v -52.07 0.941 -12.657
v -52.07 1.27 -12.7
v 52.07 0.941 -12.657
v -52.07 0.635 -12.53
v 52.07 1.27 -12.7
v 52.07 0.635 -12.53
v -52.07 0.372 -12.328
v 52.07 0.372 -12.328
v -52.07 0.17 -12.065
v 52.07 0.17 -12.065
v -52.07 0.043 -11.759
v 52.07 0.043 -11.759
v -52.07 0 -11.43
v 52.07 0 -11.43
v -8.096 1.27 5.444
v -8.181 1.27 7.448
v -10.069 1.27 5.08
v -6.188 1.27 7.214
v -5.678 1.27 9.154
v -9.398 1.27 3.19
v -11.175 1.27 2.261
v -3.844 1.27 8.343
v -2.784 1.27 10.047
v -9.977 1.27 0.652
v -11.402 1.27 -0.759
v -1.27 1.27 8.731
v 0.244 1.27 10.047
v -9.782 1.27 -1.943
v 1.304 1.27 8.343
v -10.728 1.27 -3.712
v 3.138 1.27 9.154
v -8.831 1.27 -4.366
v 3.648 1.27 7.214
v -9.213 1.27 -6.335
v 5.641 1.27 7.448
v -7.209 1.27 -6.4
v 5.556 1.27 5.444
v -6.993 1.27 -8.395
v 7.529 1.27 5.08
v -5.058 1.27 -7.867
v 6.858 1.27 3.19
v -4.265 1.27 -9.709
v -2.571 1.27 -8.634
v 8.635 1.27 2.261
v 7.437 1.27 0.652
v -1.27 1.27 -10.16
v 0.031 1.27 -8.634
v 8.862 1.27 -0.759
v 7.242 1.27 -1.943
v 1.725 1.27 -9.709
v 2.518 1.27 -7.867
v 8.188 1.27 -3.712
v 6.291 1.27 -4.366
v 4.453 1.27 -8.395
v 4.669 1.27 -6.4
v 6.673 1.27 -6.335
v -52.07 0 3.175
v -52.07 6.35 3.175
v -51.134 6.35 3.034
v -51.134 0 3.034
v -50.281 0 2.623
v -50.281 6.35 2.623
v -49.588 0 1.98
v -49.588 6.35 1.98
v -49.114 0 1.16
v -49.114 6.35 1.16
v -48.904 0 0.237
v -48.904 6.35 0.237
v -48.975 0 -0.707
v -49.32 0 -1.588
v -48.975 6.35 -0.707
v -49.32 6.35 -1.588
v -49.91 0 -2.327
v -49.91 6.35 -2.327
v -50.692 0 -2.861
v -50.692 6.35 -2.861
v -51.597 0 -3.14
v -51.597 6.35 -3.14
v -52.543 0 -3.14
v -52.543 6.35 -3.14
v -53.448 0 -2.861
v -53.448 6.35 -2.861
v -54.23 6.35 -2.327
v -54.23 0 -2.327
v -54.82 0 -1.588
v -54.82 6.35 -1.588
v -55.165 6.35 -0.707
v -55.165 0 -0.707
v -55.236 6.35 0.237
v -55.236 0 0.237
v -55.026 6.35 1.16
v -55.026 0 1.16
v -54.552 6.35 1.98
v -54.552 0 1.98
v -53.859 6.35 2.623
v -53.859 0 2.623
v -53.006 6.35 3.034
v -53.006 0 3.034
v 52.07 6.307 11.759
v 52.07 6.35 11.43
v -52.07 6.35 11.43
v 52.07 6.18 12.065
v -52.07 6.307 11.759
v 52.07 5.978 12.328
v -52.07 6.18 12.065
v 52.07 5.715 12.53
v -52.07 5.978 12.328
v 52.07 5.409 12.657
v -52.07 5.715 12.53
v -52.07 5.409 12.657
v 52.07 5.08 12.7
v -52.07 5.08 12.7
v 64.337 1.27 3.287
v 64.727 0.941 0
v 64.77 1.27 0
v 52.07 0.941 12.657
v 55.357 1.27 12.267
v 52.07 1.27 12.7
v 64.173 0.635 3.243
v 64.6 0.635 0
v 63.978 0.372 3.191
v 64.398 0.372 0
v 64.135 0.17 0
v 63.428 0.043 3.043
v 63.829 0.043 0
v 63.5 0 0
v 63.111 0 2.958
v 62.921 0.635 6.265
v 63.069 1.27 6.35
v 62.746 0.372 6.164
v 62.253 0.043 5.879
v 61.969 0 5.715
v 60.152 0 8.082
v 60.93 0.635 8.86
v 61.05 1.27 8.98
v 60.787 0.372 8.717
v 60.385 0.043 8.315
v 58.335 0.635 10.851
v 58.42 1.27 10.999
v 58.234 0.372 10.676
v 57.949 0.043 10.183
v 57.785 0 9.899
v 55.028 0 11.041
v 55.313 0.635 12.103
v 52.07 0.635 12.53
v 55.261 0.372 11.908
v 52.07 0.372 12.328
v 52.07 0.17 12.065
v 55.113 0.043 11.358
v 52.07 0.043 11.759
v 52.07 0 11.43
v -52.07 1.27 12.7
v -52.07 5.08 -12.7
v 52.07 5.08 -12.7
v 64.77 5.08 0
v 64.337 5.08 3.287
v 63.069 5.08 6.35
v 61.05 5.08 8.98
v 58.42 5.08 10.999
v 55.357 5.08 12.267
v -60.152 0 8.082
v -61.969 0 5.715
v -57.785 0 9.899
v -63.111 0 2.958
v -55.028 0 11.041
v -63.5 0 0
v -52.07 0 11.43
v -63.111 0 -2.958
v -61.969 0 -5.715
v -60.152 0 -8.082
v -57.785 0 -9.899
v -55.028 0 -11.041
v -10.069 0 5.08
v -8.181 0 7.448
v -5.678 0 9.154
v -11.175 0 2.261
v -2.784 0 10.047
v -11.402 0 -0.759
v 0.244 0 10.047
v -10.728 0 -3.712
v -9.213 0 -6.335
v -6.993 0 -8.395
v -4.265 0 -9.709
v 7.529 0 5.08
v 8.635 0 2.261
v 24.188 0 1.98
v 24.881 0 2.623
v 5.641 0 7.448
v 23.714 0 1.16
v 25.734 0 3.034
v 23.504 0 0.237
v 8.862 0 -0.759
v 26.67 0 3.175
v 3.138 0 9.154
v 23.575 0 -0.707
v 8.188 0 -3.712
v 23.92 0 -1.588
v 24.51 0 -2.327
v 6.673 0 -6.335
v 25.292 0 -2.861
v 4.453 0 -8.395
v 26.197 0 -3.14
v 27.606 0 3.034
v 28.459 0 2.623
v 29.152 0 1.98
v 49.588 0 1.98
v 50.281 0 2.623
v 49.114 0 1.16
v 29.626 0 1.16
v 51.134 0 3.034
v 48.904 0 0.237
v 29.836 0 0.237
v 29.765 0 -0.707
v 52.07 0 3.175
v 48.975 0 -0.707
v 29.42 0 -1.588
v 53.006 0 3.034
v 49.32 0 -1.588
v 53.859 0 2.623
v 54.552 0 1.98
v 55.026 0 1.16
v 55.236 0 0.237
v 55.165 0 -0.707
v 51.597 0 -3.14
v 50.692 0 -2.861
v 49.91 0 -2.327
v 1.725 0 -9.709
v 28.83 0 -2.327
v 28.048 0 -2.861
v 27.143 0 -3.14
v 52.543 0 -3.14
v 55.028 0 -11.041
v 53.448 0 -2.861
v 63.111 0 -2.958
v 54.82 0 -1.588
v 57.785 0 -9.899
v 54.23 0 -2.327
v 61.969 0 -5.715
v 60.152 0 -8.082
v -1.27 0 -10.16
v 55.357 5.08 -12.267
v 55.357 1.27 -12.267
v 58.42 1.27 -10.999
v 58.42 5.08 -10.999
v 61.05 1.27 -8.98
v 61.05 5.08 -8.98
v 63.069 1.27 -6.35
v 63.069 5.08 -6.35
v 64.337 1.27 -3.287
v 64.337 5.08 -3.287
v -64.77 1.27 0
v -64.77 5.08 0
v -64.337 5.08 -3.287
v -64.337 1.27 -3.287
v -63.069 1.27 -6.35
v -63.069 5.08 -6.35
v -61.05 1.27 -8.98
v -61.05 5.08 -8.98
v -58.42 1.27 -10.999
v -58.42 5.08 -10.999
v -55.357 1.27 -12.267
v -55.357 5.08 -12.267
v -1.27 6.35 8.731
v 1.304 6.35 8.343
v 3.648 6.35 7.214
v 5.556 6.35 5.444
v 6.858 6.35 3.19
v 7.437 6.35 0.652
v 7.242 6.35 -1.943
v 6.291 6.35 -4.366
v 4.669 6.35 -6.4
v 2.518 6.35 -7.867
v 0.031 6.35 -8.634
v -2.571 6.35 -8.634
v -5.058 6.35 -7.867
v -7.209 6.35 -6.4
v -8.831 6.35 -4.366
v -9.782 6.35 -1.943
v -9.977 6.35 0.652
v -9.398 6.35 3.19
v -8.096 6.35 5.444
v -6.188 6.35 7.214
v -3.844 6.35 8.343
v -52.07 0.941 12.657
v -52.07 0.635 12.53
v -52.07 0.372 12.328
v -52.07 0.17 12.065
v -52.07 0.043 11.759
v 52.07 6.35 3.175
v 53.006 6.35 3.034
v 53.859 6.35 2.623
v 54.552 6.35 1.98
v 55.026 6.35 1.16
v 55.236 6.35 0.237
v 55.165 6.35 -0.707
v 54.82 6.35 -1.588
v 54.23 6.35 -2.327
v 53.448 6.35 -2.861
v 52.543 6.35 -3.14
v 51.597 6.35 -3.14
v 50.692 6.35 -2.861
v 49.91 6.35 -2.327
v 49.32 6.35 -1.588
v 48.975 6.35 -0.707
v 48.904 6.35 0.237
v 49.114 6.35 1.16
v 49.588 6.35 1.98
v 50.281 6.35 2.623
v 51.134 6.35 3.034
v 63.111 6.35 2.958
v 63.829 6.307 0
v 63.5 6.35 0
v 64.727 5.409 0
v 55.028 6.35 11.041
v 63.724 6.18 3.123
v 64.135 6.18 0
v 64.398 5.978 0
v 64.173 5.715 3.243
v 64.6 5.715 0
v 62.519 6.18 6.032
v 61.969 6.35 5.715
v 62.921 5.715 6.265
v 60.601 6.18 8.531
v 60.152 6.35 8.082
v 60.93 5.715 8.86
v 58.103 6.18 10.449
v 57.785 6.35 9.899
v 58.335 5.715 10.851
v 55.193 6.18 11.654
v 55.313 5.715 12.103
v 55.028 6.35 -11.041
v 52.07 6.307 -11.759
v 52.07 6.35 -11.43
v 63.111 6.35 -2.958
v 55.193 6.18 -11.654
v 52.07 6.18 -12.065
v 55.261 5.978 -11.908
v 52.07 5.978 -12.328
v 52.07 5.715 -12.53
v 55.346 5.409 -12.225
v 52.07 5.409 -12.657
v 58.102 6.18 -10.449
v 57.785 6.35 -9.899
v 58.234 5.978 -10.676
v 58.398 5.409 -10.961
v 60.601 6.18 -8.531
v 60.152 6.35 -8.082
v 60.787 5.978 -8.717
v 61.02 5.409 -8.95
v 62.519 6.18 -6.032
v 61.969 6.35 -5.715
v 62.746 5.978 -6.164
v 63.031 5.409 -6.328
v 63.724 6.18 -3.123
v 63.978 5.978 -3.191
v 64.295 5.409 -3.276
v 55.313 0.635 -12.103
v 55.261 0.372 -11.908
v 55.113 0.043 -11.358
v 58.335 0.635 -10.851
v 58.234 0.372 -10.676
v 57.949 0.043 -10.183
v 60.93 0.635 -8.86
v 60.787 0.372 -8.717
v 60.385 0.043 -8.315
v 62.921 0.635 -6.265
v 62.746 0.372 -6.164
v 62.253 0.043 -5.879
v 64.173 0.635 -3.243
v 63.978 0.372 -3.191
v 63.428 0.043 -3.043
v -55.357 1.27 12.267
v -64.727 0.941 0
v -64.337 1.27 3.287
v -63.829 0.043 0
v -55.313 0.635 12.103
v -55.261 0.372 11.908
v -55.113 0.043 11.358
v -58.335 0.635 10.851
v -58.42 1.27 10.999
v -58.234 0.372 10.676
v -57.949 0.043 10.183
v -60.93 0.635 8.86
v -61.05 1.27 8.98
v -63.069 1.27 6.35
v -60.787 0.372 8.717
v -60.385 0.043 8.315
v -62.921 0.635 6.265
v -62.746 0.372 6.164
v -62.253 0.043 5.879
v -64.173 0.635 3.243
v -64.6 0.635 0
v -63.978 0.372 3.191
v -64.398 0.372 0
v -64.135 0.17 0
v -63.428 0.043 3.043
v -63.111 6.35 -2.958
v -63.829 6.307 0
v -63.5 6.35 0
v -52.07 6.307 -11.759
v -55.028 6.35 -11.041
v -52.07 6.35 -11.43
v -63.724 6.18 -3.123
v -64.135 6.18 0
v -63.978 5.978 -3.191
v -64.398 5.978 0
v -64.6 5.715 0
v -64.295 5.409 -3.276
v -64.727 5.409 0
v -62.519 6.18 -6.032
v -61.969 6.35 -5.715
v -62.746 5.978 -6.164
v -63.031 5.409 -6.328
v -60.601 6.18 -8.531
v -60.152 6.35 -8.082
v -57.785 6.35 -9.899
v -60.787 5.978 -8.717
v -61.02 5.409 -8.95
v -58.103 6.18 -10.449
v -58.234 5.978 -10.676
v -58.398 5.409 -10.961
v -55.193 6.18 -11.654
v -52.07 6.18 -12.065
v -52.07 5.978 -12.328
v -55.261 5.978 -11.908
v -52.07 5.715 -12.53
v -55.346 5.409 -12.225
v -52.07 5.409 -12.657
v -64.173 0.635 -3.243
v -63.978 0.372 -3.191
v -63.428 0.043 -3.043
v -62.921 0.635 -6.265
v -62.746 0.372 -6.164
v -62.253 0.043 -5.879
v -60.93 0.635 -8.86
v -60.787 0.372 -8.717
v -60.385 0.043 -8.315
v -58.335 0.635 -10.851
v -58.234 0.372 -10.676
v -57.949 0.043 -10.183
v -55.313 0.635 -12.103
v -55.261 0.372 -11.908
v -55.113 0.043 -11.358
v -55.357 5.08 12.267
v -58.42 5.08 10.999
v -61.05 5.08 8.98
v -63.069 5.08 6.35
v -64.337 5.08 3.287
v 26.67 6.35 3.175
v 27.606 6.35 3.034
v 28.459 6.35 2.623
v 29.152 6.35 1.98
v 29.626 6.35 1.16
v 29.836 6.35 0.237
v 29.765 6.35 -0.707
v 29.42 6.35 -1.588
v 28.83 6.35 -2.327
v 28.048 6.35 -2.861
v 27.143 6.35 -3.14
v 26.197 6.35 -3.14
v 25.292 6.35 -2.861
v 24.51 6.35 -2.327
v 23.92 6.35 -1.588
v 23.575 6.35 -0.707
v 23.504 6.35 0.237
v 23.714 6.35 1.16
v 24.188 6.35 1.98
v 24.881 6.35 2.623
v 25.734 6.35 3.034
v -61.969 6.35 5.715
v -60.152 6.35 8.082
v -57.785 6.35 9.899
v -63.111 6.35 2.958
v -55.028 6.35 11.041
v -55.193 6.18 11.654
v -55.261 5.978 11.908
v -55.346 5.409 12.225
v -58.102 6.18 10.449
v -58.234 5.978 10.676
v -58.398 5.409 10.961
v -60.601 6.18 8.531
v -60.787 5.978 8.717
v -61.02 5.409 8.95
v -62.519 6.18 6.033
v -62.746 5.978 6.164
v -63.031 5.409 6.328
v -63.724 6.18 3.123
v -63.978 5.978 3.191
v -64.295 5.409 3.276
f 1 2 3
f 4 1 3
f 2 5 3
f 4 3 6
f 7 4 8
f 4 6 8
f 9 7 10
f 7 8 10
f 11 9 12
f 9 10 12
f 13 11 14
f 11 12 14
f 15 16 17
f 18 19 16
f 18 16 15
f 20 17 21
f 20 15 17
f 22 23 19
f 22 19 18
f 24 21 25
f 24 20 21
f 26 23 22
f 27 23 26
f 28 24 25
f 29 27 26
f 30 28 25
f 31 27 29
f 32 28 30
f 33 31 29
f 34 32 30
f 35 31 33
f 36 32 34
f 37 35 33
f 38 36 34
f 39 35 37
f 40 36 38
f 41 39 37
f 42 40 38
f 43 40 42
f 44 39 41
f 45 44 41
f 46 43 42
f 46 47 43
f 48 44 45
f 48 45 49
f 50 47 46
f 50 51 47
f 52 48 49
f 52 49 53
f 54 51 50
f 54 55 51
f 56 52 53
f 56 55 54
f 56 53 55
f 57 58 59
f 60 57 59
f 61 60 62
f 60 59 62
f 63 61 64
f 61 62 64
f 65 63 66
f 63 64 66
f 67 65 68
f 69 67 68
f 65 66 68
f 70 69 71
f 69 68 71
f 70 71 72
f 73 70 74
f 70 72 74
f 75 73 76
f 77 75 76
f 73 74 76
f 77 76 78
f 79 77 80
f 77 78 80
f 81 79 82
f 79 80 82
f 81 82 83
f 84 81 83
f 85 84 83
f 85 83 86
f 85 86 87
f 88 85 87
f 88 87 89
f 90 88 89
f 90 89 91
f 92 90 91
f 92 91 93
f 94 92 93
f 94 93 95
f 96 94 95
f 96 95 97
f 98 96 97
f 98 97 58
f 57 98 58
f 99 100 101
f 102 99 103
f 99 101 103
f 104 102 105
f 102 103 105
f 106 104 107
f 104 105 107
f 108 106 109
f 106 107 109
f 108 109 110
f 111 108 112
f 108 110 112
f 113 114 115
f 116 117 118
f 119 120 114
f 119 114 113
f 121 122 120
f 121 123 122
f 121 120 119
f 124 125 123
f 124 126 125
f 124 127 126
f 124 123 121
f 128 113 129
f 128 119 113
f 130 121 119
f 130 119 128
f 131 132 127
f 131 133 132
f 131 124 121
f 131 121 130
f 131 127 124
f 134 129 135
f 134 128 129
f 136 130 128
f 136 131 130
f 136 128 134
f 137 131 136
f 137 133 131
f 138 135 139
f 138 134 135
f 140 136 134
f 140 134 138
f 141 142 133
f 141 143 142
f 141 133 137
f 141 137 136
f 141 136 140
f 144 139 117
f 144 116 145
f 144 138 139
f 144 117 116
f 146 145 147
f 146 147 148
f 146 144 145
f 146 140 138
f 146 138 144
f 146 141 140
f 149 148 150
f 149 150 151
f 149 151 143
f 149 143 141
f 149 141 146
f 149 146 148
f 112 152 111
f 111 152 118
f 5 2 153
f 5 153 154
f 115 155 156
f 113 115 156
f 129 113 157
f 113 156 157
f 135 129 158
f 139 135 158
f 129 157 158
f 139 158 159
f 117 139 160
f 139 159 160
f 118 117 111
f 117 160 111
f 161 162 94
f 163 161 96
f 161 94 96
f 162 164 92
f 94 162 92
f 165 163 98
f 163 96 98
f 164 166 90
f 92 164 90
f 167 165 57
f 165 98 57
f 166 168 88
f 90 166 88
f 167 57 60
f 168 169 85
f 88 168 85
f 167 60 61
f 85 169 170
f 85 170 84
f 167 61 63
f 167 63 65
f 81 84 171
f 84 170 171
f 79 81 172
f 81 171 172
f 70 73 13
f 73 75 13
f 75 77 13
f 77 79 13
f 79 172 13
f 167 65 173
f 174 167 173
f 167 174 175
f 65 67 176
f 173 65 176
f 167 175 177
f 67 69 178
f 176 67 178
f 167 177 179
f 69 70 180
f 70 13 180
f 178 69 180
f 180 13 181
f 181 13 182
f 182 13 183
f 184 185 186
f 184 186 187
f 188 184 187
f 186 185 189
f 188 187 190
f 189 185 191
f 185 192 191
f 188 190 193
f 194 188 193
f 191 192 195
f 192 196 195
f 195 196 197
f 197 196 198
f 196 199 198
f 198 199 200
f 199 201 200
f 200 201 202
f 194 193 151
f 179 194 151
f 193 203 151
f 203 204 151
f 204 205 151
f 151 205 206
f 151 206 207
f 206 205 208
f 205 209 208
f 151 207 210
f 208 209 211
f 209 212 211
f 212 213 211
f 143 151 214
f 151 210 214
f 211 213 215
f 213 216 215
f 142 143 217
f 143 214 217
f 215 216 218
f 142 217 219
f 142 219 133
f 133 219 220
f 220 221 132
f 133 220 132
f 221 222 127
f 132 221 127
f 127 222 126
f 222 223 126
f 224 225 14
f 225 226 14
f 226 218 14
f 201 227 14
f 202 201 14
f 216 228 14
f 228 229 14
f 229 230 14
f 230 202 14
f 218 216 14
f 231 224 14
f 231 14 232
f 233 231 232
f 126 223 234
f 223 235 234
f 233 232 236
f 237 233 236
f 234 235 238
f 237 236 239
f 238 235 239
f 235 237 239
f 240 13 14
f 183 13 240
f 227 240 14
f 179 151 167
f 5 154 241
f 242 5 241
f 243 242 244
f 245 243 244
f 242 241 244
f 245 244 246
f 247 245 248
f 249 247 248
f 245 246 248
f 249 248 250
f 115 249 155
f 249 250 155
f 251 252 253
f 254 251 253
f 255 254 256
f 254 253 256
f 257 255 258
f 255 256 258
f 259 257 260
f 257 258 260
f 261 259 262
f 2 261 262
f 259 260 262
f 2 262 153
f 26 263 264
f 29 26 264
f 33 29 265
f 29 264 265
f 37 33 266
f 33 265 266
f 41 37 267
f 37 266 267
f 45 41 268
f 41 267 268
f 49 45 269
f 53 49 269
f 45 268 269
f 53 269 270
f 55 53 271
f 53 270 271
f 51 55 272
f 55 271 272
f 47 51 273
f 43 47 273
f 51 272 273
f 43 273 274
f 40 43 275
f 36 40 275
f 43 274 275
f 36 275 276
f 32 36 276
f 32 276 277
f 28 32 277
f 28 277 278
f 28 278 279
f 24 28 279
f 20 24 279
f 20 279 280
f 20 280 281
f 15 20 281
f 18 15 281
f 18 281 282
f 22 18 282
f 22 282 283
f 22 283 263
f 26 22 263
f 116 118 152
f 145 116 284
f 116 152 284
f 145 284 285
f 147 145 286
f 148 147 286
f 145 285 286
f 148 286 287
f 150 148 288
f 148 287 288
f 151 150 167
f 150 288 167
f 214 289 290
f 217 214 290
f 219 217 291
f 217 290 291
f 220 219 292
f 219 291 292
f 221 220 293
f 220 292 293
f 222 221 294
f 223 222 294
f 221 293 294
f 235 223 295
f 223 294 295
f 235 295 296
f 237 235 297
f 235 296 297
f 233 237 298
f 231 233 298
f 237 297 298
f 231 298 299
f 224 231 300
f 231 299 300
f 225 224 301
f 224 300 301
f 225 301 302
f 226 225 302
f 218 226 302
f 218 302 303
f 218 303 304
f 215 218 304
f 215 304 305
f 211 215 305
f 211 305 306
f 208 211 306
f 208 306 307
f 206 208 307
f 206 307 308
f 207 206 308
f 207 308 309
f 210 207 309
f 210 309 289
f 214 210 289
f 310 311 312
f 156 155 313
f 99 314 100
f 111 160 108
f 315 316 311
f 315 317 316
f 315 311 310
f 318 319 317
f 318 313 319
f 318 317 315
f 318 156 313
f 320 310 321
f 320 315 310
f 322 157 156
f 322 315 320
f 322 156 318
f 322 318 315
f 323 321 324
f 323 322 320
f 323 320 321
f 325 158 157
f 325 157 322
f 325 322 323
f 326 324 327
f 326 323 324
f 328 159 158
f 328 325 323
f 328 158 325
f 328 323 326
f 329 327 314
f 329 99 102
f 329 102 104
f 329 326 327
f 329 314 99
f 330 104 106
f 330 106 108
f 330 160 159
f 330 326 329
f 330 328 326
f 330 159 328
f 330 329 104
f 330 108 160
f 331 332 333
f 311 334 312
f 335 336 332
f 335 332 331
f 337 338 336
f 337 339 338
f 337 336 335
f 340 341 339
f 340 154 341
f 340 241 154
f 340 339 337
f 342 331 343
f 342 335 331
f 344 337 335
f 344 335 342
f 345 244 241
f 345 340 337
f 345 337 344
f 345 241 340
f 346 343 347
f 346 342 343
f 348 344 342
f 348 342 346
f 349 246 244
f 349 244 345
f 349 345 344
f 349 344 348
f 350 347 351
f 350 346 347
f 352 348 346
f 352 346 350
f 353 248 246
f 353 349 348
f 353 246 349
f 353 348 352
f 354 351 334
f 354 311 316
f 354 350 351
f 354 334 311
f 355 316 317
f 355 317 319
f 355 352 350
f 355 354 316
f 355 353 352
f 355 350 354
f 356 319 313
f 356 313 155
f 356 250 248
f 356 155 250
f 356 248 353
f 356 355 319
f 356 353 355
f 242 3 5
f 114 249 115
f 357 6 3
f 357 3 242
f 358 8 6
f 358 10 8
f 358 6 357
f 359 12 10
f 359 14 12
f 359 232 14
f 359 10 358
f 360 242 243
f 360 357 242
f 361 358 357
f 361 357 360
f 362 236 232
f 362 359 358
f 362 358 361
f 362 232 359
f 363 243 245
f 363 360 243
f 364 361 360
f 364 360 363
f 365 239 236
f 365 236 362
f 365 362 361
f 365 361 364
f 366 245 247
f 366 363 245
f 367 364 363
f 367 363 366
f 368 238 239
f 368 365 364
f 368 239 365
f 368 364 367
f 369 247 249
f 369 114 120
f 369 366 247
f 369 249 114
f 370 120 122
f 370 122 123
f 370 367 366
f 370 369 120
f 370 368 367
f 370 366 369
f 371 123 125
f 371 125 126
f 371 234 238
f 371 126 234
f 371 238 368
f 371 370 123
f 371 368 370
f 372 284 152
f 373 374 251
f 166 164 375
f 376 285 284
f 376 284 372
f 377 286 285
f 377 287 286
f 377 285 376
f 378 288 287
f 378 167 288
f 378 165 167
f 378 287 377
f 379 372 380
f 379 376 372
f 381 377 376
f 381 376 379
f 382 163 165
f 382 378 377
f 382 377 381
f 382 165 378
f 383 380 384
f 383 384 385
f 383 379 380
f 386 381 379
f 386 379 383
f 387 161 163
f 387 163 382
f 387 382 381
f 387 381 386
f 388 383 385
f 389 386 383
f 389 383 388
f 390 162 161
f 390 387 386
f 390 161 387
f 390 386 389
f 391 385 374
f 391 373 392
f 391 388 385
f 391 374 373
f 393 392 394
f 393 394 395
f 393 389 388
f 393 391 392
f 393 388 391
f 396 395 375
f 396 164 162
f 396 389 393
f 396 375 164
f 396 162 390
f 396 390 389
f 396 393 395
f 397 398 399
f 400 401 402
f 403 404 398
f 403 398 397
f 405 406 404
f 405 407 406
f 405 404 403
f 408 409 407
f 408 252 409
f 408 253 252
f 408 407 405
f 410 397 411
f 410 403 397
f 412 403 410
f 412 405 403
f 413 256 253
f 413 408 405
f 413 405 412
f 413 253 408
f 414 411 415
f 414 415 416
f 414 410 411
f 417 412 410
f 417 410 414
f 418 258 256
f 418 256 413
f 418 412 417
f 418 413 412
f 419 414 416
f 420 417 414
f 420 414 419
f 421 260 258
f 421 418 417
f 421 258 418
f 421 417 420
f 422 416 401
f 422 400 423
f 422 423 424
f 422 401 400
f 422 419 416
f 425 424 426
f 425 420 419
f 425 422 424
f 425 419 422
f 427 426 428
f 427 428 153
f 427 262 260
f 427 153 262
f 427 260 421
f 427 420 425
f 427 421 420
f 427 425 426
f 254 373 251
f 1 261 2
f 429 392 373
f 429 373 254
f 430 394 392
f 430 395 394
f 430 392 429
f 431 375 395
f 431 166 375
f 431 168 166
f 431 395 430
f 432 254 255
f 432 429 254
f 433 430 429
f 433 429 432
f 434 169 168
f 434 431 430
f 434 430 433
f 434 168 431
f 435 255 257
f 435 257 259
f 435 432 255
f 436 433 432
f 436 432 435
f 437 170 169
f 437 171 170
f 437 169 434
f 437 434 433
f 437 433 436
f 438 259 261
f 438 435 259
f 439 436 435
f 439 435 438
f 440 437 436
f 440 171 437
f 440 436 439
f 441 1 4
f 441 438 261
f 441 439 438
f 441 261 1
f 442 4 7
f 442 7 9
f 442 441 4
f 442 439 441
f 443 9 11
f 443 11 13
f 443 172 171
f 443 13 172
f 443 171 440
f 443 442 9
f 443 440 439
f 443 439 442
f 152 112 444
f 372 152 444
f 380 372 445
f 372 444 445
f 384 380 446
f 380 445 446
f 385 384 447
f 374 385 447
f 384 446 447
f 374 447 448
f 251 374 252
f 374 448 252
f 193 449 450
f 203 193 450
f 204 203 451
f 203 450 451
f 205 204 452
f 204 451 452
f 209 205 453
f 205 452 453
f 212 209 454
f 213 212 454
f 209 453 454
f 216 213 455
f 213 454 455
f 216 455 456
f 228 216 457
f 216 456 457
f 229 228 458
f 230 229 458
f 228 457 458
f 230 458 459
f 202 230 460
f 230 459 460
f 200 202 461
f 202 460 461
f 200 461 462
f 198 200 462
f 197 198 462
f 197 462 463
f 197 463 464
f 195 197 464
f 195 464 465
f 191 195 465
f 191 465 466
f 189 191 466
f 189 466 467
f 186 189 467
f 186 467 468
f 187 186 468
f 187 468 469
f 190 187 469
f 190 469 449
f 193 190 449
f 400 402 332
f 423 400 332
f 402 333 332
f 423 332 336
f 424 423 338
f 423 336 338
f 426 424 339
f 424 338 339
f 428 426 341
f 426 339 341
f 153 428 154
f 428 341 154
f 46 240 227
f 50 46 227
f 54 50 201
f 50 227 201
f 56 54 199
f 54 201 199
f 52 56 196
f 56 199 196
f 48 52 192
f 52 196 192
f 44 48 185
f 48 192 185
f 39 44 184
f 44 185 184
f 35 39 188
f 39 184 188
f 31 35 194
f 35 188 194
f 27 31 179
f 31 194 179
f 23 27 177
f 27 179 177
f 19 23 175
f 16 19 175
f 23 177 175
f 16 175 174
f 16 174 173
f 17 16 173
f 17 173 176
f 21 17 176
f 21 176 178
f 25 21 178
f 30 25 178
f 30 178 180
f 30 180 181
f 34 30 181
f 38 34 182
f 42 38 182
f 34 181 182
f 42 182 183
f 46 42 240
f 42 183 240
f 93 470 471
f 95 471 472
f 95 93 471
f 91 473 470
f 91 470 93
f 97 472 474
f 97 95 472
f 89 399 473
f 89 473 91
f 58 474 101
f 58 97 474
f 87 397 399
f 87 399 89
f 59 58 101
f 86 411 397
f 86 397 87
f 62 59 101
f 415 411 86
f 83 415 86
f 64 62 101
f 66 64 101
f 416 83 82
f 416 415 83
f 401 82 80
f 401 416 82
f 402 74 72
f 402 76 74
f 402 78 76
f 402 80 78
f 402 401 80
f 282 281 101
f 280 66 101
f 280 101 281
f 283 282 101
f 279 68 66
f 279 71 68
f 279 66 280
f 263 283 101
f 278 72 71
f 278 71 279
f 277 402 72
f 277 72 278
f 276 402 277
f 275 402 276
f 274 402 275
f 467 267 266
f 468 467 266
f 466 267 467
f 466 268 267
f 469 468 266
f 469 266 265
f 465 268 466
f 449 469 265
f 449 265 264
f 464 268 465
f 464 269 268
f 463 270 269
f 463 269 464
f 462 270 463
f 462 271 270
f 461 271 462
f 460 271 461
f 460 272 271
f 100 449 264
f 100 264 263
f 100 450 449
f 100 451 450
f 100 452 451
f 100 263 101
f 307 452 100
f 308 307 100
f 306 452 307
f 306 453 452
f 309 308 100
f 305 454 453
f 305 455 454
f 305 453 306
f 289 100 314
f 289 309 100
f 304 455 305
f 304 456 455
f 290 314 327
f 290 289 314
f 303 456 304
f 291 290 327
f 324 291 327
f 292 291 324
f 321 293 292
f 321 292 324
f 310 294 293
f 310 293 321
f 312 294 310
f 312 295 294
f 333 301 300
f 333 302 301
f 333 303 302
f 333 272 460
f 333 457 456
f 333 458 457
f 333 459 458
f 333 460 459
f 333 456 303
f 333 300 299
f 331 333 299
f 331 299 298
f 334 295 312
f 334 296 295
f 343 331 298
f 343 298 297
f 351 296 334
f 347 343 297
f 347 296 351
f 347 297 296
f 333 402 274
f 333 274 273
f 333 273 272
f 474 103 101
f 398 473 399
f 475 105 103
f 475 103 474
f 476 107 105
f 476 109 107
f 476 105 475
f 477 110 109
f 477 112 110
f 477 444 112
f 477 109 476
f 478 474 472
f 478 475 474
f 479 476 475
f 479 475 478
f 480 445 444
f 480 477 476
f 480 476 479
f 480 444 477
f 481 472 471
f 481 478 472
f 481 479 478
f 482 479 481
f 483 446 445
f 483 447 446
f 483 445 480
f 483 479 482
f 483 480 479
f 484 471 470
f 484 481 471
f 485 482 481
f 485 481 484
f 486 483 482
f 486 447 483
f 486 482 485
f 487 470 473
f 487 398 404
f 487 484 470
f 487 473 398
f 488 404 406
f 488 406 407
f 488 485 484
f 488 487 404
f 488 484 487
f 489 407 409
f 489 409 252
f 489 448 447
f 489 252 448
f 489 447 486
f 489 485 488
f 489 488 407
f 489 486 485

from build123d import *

# Parameters (mm, degrees)
SKETCH1_W           = 129.54
SKETCH1_H           = 25.4
BOSS_EXTRUDE1_DEPTH = 6.35
SKETCH2_R           = 3.175
SKETCH2_R_2         = 8.73125
CUT_EXTRUDE1_DEPTH  = 67.30810961
SKETCH3_R           = 10.16
CUT_EXTRUDE2_DEPTH  = 1.27
CUT_EXTRUDE3_DEPTH  = 67.30810961
FILLET1_R           = 1.27


with BuildPart() as part:
    # Sketch1 → Boss-Extrude1 (new body)
    with BuildSketch(Plane(origin=(0, 0, 0), x_dir=(1, 0, 0), z_dir=(0, 1, 0))):
        Rectangle(SKETCH1_W, SKETCH1_H)
    extrude(amount=BOSS_EXTRUDE1_DEPTH)

    # Sketch2 → Cut-Extrude1 (cut, through all)
    with BuildSketch(Plane(origin=(0, 6.35, 0), x_dir=(1, 0, 0), z_dir=(0, 1, 0))):
        with Locations(Location((-52.07, 0, 0), (0, 0, 270))):
            Circle(SKETCH2_R)
        with Locations(Location((26.67, 0, 0), (0, 0, 270))):
            Circle(SKETCH2_R)
        with Locations(Location((52.07, 0, 0), (0, 0, 270))):
            Circle(SKETCH2_R)
        with Locations(Location((-1.27, 0, 0), (0, 0, 270))):
            Circle(SKETCH2_R_2)
    extrude(amount=-CUT_EXTRUDE1_DEPTH, mode=Mode.SUBTRACT)

    # Sketch3 → Cut-Extrude2 (cut)
    with BuildSketch(Plane(origin=(0, 0, 0), x_dir=(-1, 0, 0), z_dir=(0, -1, 0))):
        with Locations(Location((1.27, 0, 0), (0, 0, 90))):
            Circle(SKETCH3_R)
    extrude(amount=-CUT_EXTRUDE2_DEPTH, mode=Mode.SUBTRACT)

    # Sketch5 → Cut-Extrude3 (cut, through all)
    with BuildSketch(Plane(origin=(0, 6.35, 0), x_dir=(1, 0, 0), z_dir=(0, 1, 0))):
        with BuildLine():
            ThreePointArc((-64.77, -3.9e-08), (-61.050256152, 8.98025609), (-52.070000049, 12.7))
            Line((-52.070000049, 12.7), (-64.77, 12.7))
            Line((-64.77, 12.7), (-64.77, -3.9e-08))
        make_face()
        with BuildLine():
            Line((-64.77, -12.7), (-52.07, -12.7))
            ThreePointArc((-52.07, -12.7), (-61.050256107, -8.980256135), (-64.77, -3.9e-08))
            Line((-64.77, -3.9e-08), (-64.77, -12.7))
        make_face()
        with BuildLine():
            ThreePointArc((64.77, 0), (61.050256132, -8.98025611), (52.07000003, -12.7))
            Line((52.07000003, -12.7), (64.77, -12.7))
            Line((64.77, -12.7), (64.77, 0))
        make_face()
        with BuildLine():
            Line((64.77, 12.7), (52.07, 12.7))
            ThreePointArc((52.07, 12.7), (61.050256121, 8.980256121), (64.77, 0))
            Line((64.77, 0), (64.77, 12.7))
        make_face()
    extrude(amount=-CUT_EXTRUDE3_DEPTH, mode=Mode.SUBTRACT)

    # Fillet1
    fillet1_edges = [part.edges().sort_by_distance(p)[0] for p in [
        (-2.4e-08, 0, -12.7),
        (-2.4e-08, 6.35, -12.7),
        (-64.77, 6.35, 2.4e-08),
        (-64.77, 0, 2.4e-08),
        (64.77, 6.35, -1.5e-08),
        (64.77, 0, -1.5e-08),
        (1.5e-08, 0, 12.7),
        (1.5e-08, 6.35, 12.7),
    ]]
    fillet(fillet1_edges, radius=FILLET1_R)


solid = part.part
